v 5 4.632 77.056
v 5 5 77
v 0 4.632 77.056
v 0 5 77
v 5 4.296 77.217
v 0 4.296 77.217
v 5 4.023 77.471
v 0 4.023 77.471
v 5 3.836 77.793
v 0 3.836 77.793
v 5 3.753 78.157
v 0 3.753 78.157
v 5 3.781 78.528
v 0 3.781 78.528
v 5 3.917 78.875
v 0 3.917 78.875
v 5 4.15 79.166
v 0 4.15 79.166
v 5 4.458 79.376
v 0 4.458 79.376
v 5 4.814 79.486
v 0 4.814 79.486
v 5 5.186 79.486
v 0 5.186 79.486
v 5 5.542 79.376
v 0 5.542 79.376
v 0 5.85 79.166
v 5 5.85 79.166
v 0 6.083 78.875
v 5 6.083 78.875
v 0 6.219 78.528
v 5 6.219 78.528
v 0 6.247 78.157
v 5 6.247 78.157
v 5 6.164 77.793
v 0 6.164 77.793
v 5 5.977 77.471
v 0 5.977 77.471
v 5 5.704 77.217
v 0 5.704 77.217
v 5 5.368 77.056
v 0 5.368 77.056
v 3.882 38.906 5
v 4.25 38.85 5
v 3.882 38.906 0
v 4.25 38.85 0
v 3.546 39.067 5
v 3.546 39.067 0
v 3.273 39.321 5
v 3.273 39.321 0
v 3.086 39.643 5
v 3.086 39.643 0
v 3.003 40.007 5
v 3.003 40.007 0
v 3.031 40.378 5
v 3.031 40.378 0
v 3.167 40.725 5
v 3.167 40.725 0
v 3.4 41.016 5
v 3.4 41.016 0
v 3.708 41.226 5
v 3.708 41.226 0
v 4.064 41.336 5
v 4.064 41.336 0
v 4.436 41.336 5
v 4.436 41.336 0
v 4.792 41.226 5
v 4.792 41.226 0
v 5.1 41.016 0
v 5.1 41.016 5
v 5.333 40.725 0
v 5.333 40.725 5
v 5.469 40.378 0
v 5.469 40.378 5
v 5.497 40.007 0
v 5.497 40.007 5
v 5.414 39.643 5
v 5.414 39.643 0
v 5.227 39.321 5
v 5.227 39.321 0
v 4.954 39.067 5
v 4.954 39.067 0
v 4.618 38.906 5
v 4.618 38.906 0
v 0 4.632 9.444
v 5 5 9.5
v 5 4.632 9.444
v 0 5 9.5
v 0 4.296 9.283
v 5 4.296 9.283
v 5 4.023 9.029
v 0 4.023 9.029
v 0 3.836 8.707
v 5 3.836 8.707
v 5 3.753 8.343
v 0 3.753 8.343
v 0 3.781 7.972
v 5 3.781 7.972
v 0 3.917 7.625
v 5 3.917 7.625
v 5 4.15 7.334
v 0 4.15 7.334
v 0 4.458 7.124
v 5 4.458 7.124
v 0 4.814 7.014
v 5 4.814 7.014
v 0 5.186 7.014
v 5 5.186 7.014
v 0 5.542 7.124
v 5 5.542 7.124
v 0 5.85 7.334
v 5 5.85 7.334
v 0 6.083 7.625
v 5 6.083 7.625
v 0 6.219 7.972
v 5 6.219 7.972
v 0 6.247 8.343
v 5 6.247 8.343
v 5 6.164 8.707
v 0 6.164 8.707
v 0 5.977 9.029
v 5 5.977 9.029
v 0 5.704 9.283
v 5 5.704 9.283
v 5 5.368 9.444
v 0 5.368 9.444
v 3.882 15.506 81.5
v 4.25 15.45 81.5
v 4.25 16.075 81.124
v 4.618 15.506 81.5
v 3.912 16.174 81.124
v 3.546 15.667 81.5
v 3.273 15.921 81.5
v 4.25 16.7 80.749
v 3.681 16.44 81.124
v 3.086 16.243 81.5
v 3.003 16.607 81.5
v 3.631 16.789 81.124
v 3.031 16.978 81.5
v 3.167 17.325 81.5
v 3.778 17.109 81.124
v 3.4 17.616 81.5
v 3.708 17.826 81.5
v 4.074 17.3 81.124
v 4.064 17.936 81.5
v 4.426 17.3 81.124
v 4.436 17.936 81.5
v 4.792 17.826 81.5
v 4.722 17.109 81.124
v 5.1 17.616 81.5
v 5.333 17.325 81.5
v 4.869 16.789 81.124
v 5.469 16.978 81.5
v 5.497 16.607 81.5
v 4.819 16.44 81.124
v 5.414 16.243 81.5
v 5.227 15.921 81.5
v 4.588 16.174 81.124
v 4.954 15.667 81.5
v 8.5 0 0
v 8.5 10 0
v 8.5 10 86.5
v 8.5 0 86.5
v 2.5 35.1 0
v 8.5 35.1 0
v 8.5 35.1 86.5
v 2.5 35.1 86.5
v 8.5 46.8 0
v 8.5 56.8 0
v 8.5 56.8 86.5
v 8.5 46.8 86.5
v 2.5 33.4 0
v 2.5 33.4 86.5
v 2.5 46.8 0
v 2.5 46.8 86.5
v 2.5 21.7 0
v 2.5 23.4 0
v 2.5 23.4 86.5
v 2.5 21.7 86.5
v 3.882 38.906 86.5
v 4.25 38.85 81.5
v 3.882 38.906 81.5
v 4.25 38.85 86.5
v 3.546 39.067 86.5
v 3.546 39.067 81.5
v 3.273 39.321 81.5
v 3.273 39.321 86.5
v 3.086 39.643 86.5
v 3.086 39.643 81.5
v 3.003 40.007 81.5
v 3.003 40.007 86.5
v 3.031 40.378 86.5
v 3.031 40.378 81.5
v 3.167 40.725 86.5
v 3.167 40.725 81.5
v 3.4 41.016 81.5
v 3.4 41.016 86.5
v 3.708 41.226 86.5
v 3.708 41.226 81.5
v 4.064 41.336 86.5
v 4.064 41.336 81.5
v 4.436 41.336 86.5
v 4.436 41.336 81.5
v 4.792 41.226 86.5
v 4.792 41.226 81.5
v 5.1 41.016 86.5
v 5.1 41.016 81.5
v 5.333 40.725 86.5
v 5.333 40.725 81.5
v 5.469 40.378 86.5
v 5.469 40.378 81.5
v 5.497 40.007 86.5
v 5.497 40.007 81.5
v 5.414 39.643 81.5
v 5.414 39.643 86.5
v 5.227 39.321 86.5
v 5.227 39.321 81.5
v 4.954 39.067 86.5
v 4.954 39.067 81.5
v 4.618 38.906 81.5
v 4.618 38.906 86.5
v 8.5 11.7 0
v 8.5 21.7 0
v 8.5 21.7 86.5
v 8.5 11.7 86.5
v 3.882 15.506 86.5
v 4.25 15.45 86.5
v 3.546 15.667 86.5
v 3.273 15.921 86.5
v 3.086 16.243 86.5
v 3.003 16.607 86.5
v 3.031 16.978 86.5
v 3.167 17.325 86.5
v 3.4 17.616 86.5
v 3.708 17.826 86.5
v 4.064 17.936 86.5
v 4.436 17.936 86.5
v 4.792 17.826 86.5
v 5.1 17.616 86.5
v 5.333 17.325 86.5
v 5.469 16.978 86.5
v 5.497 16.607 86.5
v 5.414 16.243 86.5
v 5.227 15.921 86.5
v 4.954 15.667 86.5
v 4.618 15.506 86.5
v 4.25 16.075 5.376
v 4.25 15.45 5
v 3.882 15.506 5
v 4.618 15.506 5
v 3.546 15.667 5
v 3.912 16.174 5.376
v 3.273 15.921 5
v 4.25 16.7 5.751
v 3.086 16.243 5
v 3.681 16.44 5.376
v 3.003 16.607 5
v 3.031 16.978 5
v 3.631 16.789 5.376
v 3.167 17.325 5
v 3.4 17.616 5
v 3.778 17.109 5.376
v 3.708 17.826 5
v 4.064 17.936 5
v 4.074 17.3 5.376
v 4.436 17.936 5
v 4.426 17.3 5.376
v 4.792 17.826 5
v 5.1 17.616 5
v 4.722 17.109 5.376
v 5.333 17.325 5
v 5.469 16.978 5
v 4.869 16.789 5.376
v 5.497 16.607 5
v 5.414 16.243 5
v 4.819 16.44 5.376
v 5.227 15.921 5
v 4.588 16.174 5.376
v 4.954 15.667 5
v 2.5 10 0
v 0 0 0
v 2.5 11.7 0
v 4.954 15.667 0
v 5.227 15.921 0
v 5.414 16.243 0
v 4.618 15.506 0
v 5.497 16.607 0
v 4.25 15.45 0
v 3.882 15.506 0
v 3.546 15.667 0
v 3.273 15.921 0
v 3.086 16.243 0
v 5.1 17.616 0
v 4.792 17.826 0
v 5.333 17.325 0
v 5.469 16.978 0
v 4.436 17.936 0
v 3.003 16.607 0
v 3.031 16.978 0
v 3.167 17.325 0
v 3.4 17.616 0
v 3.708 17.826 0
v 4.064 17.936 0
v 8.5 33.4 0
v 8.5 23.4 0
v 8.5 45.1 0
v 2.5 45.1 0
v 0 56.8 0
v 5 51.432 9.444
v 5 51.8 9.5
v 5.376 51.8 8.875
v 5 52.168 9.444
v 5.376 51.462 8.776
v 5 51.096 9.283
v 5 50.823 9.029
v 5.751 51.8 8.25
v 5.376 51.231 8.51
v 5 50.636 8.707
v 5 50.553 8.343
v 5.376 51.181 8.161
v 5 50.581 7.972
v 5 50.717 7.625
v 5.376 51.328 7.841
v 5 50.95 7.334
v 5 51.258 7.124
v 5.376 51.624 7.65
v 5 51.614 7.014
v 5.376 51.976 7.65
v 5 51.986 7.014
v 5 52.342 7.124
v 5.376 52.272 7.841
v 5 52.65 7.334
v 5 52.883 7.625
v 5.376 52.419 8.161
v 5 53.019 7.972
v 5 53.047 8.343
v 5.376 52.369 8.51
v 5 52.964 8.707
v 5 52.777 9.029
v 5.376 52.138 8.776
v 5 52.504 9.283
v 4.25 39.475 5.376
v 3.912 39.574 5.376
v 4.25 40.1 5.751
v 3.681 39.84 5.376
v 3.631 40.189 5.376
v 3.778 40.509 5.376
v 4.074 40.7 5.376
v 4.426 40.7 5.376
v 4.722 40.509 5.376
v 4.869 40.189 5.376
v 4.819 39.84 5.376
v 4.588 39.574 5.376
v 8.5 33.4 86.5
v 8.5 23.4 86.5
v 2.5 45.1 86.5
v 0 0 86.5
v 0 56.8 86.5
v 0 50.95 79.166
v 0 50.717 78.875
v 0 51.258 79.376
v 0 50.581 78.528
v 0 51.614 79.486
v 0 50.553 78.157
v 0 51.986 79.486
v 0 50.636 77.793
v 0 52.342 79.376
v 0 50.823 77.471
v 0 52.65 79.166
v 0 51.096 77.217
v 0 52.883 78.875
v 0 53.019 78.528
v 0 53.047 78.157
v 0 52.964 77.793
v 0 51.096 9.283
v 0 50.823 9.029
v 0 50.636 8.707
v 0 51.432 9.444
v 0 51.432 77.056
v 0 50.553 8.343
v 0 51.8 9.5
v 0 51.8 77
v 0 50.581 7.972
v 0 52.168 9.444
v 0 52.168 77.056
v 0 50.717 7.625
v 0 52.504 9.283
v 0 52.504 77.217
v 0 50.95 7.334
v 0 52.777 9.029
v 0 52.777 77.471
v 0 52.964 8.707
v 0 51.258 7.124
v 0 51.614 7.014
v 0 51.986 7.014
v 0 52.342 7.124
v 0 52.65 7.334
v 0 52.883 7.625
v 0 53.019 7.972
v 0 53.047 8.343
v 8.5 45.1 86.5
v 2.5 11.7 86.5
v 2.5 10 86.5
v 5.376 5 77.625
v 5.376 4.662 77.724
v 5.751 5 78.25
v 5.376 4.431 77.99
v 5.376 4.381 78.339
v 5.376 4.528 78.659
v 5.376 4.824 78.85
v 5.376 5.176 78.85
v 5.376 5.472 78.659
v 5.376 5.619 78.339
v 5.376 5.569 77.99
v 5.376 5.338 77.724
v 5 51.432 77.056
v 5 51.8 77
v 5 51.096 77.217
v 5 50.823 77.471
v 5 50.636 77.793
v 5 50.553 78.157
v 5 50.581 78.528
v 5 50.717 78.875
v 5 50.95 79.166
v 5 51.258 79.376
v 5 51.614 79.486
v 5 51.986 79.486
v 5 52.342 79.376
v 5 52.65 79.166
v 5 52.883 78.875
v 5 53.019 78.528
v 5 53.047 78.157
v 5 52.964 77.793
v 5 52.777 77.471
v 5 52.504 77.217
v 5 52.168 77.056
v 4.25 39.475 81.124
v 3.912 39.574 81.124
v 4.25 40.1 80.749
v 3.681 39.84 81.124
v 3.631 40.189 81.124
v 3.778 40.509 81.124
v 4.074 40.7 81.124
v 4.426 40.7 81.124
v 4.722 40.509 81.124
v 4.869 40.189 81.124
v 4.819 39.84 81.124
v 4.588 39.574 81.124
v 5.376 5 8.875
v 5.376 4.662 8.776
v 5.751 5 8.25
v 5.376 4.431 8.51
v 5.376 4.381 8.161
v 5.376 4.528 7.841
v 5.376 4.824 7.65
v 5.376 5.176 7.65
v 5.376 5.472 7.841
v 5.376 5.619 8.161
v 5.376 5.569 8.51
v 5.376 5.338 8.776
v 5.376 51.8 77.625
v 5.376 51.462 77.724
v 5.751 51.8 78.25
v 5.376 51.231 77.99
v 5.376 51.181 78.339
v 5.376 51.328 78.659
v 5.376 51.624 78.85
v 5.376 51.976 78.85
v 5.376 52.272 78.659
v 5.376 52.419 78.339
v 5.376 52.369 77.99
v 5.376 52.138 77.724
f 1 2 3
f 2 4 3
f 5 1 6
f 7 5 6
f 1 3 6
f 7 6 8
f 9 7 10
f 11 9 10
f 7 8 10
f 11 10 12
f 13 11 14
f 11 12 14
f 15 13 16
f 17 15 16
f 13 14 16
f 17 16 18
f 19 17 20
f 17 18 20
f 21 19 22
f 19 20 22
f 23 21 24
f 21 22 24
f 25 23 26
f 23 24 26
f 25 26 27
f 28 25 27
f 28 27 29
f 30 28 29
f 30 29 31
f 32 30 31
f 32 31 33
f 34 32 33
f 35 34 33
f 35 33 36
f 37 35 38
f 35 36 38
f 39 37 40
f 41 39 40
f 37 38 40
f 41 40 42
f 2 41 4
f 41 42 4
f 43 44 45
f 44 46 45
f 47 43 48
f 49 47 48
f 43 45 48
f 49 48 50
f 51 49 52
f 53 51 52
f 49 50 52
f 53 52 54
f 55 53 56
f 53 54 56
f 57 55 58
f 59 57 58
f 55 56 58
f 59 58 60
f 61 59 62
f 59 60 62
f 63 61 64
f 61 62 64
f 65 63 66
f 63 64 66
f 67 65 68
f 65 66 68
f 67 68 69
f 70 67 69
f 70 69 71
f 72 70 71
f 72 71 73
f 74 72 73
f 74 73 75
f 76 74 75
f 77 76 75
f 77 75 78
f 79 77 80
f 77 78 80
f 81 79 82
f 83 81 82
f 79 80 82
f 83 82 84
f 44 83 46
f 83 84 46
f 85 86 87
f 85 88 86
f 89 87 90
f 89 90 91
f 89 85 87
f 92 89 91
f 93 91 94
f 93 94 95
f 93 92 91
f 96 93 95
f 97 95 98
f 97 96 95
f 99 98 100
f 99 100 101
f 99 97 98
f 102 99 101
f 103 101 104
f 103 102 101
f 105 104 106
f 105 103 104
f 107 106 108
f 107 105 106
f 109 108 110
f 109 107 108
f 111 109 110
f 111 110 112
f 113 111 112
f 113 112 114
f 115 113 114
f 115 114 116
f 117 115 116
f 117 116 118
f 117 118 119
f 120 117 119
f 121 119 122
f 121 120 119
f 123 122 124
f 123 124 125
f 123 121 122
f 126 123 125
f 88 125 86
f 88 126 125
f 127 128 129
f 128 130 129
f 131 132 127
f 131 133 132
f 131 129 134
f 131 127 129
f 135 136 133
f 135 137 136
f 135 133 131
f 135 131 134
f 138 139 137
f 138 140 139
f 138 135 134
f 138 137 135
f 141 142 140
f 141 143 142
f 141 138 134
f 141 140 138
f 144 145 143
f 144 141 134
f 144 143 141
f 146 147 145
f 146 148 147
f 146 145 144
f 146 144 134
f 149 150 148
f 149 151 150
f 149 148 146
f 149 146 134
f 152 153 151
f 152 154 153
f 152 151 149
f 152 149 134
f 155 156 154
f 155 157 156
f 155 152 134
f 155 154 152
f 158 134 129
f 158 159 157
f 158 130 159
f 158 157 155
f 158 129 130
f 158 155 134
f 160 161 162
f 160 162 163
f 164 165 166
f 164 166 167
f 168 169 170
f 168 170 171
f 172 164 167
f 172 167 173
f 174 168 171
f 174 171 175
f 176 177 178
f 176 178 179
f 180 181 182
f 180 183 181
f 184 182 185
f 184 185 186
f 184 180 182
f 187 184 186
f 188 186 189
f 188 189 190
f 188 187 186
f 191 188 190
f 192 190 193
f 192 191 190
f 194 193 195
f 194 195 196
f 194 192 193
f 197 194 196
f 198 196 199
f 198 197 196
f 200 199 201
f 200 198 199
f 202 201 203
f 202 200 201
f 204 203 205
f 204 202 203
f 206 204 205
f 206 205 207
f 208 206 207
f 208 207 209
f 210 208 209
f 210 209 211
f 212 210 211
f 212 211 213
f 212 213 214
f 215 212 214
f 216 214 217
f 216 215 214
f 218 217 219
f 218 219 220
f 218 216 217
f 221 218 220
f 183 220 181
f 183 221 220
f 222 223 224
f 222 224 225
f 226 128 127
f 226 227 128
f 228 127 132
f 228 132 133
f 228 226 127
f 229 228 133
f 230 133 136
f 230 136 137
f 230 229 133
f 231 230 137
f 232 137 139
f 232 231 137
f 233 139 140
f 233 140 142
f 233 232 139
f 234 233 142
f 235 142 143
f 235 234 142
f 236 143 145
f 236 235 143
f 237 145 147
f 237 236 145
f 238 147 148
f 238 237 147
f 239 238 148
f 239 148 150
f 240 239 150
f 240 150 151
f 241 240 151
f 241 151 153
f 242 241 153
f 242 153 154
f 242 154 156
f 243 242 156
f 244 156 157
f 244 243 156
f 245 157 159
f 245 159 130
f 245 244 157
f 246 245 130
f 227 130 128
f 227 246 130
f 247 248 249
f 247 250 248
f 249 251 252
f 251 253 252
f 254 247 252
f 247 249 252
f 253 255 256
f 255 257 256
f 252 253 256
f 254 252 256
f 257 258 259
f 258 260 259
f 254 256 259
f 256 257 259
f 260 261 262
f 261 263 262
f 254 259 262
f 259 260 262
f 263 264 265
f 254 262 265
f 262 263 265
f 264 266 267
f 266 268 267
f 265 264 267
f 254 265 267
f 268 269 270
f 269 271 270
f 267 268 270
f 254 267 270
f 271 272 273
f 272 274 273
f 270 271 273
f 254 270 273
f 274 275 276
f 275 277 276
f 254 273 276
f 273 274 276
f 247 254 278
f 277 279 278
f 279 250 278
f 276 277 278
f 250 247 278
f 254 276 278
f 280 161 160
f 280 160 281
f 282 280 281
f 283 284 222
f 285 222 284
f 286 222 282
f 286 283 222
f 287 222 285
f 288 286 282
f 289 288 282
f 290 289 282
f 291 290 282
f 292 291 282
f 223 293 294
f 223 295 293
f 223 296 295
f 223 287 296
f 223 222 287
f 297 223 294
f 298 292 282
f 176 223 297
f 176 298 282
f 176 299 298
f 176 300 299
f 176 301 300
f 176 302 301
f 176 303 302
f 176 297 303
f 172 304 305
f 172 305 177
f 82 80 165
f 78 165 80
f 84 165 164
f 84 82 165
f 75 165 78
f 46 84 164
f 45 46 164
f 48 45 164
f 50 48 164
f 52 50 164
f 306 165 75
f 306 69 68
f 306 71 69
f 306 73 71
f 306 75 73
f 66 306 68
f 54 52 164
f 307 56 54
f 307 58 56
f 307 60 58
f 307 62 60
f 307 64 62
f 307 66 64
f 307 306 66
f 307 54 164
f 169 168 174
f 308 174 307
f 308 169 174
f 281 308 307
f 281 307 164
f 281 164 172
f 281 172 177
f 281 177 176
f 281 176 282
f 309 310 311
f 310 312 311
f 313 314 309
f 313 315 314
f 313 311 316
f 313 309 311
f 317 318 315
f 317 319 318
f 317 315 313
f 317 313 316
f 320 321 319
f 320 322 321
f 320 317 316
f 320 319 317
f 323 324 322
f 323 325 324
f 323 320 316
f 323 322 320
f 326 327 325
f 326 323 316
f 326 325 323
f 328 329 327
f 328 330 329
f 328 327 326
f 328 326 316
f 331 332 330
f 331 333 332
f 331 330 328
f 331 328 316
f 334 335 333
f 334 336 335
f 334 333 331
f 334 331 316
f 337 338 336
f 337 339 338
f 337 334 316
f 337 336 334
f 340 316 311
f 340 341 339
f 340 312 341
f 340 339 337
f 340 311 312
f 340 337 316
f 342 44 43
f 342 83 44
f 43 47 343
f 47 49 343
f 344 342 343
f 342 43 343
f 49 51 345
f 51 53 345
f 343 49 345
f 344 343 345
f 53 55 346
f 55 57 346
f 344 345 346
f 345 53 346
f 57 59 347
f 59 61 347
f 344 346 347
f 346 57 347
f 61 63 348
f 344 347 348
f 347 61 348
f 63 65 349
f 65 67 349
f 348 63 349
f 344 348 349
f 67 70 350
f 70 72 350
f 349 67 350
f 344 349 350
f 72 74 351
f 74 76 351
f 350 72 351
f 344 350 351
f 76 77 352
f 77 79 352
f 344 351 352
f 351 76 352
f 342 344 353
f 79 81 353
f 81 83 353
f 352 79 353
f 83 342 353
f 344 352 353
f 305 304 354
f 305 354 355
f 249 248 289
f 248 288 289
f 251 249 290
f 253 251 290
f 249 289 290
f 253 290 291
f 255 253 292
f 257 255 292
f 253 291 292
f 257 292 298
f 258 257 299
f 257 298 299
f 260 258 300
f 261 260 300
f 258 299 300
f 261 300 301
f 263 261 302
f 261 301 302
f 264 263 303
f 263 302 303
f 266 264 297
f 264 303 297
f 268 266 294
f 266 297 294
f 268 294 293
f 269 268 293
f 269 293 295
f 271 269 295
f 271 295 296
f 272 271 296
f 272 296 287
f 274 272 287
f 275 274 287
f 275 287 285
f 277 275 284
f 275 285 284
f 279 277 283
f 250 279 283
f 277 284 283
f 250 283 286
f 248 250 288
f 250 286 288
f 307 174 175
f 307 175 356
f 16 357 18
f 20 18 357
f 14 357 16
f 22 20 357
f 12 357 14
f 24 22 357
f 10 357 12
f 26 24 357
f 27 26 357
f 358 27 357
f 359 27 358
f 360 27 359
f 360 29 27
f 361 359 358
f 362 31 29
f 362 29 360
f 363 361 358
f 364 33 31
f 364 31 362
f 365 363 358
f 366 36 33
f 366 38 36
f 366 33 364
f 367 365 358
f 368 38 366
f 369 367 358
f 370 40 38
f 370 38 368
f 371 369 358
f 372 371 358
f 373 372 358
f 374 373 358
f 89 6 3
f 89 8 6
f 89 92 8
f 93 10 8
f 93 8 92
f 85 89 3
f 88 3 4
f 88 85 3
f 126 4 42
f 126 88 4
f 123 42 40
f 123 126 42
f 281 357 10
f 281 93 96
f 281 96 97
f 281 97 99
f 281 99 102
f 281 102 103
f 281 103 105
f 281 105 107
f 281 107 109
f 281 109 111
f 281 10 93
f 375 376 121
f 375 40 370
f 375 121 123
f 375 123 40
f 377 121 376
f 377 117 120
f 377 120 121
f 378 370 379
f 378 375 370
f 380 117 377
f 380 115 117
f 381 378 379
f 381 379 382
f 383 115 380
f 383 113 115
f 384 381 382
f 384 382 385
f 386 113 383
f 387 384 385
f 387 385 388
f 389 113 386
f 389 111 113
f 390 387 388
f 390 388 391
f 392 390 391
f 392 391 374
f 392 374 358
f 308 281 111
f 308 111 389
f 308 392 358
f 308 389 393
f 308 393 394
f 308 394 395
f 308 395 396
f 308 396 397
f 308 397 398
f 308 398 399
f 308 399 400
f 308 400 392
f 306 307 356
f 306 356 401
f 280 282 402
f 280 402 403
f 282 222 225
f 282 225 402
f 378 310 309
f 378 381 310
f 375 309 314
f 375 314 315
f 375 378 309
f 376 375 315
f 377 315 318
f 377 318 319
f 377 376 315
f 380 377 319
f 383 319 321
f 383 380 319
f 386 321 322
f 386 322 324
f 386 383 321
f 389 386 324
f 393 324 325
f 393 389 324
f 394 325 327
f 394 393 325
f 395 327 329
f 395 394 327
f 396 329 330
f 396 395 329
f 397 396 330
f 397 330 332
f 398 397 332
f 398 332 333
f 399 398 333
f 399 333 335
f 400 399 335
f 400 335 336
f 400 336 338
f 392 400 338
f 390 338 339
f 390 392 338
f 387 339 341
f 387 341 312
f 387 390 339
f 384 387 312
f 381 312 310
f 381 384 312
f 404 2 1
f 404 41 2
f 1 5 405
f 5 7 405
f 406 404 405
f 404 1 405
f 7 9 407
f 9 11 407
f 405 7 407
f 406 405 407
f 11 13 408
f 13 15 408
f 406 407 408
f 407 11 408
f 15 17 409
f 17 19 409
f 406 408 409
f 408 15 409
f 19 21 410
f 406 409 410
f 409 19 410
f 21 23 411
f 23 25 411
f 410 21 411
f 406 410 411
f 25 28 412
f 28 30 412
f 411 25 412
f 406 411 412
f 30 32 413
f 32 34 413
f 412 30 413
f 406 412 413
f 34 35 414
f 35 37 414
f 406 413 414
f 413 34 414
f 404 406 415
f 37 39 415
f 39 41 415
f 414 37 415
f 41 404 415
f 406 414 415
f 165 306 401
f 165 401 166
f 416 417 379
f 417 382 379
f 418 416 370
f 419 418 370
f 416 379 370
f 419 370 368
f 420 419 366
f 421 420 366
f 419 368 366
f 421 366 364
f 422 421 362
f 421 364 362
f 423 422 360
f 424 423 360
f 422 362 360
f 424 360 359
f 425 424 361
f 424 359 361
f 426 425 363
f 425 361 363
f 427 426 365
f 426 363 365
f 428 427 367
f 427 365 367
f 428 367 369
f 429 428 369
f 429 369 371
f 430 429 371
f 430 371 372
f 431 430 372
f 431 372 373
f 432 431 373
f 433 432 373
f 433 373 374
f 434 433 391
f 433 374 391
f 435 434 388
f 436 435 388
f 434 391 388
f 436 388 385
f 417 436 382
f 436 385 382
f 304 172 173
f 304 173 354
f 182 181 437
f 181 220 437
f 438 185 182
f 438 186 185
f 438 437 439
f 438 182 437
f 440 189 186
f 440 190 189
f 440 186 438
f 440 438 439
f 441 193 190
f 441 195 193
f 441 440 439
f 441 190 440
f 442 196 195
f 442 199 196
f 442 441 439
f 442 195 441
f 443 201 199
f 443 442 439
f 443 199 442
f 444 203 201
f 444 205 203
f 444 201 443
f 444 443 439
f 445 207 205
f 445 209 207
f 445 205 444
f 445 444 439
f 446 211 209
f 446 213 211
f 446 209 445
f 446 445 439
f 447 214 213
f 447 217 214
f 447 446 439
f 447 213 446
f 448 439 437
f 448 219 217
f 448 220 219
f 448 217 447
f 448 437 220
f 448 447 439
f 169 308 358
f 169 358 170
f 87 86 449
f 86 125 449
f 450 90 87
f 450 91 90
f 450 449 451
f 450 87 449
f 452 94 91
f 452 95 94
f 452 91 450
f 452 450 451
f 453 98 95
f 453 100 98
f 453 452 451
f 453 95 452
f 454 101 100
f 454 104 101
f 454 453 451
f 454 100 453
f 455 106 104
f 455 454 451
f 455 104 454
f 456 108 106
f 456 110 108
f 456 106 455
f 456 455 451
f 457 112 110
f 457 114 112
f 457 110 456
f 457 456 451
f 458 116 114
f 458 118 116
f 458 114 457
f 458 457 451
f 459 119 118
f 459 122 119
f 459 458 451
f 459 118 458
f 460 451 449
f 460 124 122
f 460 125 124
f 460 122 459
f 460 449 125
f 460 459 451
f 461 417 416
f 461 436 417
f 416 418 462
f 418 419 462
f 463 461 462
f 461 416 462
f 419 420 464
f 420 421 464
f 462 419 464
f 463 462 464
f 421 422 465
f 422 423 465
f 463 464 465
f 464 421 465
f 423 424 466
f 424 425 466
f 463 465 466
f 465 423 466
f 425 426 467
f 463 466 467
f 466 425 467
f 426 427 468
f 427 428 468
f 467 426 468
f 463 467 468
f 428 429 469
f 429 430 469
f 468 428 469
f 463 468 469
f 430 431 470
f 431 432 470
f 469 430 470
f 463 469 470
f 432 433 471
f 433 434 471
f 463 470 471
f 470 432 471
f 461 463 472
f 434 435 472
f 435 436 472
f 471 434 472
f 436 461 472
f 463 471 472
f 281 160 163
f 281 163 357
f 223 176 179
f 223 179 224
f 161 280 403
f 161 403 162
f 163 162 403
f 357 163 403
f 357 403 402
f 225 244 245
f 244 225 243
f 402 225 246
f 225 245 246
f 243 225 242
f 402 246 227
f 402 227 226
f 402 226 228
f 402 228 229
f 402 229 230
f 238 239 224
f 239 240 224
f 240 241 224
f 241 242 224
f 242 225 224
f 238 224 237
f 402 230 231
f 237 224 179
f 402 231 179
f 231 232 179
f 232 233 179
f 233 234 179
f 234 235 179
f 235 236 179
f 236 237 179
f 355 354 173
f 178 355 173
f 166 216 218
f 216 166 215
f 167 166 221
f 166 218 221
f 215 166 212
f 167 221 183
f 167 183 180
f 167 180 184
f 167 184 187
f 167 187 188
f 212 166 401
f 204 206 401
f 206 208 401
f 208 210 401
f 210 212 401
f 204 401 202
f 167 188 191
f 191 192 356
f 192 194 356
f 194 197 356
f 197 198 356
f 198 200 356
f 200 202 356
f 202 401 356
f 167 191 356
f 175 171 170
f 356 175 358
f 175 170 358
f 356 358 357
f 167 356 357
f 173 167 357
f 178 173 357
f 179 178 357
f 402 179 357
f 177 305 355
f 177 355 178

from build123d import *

# Parameters (mm, degrees)
BOSS_EXTRUDE1_DEPTH            = 86.5
M3X0_5_TAPPED_HOLE2_AT_2_COUNT = 2
M3X0_5_TAPPED_HOLE2_AT_2_PITCH = 23.4
M3X0_5_TAPPED_HOLE1_AT_2_COUNT = 2
M3X0_5_TAPPED_HOLE1_AT_2_PITCH = 46.8


with BuildPart() as part:
    # Sketch1 → Boss-Extrude1 (new body)
    with BuildSketch(Plane.XY):
        Polygon((0, 0), (0, 56.8), (8.5, 56.8), (8.5, 46.8), (2.5, 46.8), (2.5, 45.1), (8.5, 45.1), (8.5, 35.1), (2.5, 35.1), (2.5, 33.4), (8.5, 33.4), (8.5, 23.4), (2.5, 23.4), (2.5, 21.7), (8.5, 21.7), (8.5, 11.7), (2.5, 11.7), (2.5, 10), (8.5, 10), (8.5, 0), align=None)
    extrude(amount=BOSS_EXTRUDE1_DEPTH)

    # Sketch4 → M3x0.5 Tapped Hole2 (revolve, cut)
    with BuildSketch(Plane(origin=(4.25, 40.1, 86.5), x_dir=(0, -1, 0), z_dir=(1, 0, 0))):
        Polygon((0, 0), (0, 5.751075774), (1.25, 5), (1.25, 0), align=None)
    m3x0_5_tapped_hole2 = revolve(axis=Axis((4.25, 40.1, 92.85), (0, 0, -1)), mode=Mode.SUBTRACT)

    # M3x0.5 Tapped Hole2 at 2: M3x0.5 Tapped Hole2 ×2
    with Locations(*[(0, -i * M3X0_5_TAPPED_HOLE2_AT_2_PITCH, 0) for i in range(1, M3X0_5_TAPPED_HOLE2_AT_2_COUNT)]):
        add(m3x0_5_tapped_hole2, mode=Mode.SUBTRACT)

    # Mirror1: M3x0.5 Tapped Hole2 across plane
    add(m3x0_5_tapped_hole2.mirror(Plane.XY.offset(43.25)), mode=Mode.SUBTRACT)

    # Mirror1 copy 1 sketch → Mirror1 copy 1 (revolve, cut)
    with BuildSketch(Plane(origin=(4.25, 16.7, 0), x_dir=(0, -1, 0), z_dir=(1, 0, 0))):
        Polygon((0, 0), (0, -5.751075774), (1.25, -5), (1.25, 0), align=None)
    revolve(axis=Axis((4.25, 16.7, -6.35), (0, 0, -1)), mode=Mode.SUBTRACT)

    # Sketch11 → M3x0.5 Tapped Hole1 (revolve, cut)
    with BuildSketch(Plane(origin=(0, 5, 8.25), x_dir=(0, 0, 1), z_dir=(0, 1, 0))):
        Polygon((0, 0), (0, 5.751075774), (1.25, 5), (1.25, 0), align=None)
    m3x0_5_tapped_hole1 = revolve(axis=Axis((-6.35, 5, 8.25), (1, 0, 0)), mode=Mode.SUBTRACT)

    # M3x0.5 Tapped Hole1 at 2: M3x0.5 Tapped Hole1 ×2
    with Locations(*[(0, i * M3X0_5_TAPPED_HOLE1_AT_2_PITCH, 0) for i in range(1, M3X0_5_TAPPED_HOLE1_AT_2_COUNT)]):
        add(m3x0_5_tapped_hole1, mode=Mode.SUBTRACT)

    # Mirror2: M3x0.5 Tapped Hole1 across plane
    add(m3x0_5_tapped_hole1.mirror(Plane(origin=(0, 0, 43.25), x_dir=(1, 0, 0), z_dir=(0, 0, -1))), mode=Mode.SUBTRACT)

    # Mirror2 copy 1 sketch → Mirror2 copy 1 (revolve, cut)
    with BuildSketch(Plane(origin=(0, 51.8, 78.25), x_dir=(0, 0, -1), z_dir=(0, 1, 0))):
        Polygon((0, 0), (0, -5.751075774), (1.25, -5), (1.25, 0), align=None)
    revolve(axis=Axis((-6.35, 51.8, 78.25), (-1, 0, 0)), mode=Mode.SUBTRACT)


solid = part.part
